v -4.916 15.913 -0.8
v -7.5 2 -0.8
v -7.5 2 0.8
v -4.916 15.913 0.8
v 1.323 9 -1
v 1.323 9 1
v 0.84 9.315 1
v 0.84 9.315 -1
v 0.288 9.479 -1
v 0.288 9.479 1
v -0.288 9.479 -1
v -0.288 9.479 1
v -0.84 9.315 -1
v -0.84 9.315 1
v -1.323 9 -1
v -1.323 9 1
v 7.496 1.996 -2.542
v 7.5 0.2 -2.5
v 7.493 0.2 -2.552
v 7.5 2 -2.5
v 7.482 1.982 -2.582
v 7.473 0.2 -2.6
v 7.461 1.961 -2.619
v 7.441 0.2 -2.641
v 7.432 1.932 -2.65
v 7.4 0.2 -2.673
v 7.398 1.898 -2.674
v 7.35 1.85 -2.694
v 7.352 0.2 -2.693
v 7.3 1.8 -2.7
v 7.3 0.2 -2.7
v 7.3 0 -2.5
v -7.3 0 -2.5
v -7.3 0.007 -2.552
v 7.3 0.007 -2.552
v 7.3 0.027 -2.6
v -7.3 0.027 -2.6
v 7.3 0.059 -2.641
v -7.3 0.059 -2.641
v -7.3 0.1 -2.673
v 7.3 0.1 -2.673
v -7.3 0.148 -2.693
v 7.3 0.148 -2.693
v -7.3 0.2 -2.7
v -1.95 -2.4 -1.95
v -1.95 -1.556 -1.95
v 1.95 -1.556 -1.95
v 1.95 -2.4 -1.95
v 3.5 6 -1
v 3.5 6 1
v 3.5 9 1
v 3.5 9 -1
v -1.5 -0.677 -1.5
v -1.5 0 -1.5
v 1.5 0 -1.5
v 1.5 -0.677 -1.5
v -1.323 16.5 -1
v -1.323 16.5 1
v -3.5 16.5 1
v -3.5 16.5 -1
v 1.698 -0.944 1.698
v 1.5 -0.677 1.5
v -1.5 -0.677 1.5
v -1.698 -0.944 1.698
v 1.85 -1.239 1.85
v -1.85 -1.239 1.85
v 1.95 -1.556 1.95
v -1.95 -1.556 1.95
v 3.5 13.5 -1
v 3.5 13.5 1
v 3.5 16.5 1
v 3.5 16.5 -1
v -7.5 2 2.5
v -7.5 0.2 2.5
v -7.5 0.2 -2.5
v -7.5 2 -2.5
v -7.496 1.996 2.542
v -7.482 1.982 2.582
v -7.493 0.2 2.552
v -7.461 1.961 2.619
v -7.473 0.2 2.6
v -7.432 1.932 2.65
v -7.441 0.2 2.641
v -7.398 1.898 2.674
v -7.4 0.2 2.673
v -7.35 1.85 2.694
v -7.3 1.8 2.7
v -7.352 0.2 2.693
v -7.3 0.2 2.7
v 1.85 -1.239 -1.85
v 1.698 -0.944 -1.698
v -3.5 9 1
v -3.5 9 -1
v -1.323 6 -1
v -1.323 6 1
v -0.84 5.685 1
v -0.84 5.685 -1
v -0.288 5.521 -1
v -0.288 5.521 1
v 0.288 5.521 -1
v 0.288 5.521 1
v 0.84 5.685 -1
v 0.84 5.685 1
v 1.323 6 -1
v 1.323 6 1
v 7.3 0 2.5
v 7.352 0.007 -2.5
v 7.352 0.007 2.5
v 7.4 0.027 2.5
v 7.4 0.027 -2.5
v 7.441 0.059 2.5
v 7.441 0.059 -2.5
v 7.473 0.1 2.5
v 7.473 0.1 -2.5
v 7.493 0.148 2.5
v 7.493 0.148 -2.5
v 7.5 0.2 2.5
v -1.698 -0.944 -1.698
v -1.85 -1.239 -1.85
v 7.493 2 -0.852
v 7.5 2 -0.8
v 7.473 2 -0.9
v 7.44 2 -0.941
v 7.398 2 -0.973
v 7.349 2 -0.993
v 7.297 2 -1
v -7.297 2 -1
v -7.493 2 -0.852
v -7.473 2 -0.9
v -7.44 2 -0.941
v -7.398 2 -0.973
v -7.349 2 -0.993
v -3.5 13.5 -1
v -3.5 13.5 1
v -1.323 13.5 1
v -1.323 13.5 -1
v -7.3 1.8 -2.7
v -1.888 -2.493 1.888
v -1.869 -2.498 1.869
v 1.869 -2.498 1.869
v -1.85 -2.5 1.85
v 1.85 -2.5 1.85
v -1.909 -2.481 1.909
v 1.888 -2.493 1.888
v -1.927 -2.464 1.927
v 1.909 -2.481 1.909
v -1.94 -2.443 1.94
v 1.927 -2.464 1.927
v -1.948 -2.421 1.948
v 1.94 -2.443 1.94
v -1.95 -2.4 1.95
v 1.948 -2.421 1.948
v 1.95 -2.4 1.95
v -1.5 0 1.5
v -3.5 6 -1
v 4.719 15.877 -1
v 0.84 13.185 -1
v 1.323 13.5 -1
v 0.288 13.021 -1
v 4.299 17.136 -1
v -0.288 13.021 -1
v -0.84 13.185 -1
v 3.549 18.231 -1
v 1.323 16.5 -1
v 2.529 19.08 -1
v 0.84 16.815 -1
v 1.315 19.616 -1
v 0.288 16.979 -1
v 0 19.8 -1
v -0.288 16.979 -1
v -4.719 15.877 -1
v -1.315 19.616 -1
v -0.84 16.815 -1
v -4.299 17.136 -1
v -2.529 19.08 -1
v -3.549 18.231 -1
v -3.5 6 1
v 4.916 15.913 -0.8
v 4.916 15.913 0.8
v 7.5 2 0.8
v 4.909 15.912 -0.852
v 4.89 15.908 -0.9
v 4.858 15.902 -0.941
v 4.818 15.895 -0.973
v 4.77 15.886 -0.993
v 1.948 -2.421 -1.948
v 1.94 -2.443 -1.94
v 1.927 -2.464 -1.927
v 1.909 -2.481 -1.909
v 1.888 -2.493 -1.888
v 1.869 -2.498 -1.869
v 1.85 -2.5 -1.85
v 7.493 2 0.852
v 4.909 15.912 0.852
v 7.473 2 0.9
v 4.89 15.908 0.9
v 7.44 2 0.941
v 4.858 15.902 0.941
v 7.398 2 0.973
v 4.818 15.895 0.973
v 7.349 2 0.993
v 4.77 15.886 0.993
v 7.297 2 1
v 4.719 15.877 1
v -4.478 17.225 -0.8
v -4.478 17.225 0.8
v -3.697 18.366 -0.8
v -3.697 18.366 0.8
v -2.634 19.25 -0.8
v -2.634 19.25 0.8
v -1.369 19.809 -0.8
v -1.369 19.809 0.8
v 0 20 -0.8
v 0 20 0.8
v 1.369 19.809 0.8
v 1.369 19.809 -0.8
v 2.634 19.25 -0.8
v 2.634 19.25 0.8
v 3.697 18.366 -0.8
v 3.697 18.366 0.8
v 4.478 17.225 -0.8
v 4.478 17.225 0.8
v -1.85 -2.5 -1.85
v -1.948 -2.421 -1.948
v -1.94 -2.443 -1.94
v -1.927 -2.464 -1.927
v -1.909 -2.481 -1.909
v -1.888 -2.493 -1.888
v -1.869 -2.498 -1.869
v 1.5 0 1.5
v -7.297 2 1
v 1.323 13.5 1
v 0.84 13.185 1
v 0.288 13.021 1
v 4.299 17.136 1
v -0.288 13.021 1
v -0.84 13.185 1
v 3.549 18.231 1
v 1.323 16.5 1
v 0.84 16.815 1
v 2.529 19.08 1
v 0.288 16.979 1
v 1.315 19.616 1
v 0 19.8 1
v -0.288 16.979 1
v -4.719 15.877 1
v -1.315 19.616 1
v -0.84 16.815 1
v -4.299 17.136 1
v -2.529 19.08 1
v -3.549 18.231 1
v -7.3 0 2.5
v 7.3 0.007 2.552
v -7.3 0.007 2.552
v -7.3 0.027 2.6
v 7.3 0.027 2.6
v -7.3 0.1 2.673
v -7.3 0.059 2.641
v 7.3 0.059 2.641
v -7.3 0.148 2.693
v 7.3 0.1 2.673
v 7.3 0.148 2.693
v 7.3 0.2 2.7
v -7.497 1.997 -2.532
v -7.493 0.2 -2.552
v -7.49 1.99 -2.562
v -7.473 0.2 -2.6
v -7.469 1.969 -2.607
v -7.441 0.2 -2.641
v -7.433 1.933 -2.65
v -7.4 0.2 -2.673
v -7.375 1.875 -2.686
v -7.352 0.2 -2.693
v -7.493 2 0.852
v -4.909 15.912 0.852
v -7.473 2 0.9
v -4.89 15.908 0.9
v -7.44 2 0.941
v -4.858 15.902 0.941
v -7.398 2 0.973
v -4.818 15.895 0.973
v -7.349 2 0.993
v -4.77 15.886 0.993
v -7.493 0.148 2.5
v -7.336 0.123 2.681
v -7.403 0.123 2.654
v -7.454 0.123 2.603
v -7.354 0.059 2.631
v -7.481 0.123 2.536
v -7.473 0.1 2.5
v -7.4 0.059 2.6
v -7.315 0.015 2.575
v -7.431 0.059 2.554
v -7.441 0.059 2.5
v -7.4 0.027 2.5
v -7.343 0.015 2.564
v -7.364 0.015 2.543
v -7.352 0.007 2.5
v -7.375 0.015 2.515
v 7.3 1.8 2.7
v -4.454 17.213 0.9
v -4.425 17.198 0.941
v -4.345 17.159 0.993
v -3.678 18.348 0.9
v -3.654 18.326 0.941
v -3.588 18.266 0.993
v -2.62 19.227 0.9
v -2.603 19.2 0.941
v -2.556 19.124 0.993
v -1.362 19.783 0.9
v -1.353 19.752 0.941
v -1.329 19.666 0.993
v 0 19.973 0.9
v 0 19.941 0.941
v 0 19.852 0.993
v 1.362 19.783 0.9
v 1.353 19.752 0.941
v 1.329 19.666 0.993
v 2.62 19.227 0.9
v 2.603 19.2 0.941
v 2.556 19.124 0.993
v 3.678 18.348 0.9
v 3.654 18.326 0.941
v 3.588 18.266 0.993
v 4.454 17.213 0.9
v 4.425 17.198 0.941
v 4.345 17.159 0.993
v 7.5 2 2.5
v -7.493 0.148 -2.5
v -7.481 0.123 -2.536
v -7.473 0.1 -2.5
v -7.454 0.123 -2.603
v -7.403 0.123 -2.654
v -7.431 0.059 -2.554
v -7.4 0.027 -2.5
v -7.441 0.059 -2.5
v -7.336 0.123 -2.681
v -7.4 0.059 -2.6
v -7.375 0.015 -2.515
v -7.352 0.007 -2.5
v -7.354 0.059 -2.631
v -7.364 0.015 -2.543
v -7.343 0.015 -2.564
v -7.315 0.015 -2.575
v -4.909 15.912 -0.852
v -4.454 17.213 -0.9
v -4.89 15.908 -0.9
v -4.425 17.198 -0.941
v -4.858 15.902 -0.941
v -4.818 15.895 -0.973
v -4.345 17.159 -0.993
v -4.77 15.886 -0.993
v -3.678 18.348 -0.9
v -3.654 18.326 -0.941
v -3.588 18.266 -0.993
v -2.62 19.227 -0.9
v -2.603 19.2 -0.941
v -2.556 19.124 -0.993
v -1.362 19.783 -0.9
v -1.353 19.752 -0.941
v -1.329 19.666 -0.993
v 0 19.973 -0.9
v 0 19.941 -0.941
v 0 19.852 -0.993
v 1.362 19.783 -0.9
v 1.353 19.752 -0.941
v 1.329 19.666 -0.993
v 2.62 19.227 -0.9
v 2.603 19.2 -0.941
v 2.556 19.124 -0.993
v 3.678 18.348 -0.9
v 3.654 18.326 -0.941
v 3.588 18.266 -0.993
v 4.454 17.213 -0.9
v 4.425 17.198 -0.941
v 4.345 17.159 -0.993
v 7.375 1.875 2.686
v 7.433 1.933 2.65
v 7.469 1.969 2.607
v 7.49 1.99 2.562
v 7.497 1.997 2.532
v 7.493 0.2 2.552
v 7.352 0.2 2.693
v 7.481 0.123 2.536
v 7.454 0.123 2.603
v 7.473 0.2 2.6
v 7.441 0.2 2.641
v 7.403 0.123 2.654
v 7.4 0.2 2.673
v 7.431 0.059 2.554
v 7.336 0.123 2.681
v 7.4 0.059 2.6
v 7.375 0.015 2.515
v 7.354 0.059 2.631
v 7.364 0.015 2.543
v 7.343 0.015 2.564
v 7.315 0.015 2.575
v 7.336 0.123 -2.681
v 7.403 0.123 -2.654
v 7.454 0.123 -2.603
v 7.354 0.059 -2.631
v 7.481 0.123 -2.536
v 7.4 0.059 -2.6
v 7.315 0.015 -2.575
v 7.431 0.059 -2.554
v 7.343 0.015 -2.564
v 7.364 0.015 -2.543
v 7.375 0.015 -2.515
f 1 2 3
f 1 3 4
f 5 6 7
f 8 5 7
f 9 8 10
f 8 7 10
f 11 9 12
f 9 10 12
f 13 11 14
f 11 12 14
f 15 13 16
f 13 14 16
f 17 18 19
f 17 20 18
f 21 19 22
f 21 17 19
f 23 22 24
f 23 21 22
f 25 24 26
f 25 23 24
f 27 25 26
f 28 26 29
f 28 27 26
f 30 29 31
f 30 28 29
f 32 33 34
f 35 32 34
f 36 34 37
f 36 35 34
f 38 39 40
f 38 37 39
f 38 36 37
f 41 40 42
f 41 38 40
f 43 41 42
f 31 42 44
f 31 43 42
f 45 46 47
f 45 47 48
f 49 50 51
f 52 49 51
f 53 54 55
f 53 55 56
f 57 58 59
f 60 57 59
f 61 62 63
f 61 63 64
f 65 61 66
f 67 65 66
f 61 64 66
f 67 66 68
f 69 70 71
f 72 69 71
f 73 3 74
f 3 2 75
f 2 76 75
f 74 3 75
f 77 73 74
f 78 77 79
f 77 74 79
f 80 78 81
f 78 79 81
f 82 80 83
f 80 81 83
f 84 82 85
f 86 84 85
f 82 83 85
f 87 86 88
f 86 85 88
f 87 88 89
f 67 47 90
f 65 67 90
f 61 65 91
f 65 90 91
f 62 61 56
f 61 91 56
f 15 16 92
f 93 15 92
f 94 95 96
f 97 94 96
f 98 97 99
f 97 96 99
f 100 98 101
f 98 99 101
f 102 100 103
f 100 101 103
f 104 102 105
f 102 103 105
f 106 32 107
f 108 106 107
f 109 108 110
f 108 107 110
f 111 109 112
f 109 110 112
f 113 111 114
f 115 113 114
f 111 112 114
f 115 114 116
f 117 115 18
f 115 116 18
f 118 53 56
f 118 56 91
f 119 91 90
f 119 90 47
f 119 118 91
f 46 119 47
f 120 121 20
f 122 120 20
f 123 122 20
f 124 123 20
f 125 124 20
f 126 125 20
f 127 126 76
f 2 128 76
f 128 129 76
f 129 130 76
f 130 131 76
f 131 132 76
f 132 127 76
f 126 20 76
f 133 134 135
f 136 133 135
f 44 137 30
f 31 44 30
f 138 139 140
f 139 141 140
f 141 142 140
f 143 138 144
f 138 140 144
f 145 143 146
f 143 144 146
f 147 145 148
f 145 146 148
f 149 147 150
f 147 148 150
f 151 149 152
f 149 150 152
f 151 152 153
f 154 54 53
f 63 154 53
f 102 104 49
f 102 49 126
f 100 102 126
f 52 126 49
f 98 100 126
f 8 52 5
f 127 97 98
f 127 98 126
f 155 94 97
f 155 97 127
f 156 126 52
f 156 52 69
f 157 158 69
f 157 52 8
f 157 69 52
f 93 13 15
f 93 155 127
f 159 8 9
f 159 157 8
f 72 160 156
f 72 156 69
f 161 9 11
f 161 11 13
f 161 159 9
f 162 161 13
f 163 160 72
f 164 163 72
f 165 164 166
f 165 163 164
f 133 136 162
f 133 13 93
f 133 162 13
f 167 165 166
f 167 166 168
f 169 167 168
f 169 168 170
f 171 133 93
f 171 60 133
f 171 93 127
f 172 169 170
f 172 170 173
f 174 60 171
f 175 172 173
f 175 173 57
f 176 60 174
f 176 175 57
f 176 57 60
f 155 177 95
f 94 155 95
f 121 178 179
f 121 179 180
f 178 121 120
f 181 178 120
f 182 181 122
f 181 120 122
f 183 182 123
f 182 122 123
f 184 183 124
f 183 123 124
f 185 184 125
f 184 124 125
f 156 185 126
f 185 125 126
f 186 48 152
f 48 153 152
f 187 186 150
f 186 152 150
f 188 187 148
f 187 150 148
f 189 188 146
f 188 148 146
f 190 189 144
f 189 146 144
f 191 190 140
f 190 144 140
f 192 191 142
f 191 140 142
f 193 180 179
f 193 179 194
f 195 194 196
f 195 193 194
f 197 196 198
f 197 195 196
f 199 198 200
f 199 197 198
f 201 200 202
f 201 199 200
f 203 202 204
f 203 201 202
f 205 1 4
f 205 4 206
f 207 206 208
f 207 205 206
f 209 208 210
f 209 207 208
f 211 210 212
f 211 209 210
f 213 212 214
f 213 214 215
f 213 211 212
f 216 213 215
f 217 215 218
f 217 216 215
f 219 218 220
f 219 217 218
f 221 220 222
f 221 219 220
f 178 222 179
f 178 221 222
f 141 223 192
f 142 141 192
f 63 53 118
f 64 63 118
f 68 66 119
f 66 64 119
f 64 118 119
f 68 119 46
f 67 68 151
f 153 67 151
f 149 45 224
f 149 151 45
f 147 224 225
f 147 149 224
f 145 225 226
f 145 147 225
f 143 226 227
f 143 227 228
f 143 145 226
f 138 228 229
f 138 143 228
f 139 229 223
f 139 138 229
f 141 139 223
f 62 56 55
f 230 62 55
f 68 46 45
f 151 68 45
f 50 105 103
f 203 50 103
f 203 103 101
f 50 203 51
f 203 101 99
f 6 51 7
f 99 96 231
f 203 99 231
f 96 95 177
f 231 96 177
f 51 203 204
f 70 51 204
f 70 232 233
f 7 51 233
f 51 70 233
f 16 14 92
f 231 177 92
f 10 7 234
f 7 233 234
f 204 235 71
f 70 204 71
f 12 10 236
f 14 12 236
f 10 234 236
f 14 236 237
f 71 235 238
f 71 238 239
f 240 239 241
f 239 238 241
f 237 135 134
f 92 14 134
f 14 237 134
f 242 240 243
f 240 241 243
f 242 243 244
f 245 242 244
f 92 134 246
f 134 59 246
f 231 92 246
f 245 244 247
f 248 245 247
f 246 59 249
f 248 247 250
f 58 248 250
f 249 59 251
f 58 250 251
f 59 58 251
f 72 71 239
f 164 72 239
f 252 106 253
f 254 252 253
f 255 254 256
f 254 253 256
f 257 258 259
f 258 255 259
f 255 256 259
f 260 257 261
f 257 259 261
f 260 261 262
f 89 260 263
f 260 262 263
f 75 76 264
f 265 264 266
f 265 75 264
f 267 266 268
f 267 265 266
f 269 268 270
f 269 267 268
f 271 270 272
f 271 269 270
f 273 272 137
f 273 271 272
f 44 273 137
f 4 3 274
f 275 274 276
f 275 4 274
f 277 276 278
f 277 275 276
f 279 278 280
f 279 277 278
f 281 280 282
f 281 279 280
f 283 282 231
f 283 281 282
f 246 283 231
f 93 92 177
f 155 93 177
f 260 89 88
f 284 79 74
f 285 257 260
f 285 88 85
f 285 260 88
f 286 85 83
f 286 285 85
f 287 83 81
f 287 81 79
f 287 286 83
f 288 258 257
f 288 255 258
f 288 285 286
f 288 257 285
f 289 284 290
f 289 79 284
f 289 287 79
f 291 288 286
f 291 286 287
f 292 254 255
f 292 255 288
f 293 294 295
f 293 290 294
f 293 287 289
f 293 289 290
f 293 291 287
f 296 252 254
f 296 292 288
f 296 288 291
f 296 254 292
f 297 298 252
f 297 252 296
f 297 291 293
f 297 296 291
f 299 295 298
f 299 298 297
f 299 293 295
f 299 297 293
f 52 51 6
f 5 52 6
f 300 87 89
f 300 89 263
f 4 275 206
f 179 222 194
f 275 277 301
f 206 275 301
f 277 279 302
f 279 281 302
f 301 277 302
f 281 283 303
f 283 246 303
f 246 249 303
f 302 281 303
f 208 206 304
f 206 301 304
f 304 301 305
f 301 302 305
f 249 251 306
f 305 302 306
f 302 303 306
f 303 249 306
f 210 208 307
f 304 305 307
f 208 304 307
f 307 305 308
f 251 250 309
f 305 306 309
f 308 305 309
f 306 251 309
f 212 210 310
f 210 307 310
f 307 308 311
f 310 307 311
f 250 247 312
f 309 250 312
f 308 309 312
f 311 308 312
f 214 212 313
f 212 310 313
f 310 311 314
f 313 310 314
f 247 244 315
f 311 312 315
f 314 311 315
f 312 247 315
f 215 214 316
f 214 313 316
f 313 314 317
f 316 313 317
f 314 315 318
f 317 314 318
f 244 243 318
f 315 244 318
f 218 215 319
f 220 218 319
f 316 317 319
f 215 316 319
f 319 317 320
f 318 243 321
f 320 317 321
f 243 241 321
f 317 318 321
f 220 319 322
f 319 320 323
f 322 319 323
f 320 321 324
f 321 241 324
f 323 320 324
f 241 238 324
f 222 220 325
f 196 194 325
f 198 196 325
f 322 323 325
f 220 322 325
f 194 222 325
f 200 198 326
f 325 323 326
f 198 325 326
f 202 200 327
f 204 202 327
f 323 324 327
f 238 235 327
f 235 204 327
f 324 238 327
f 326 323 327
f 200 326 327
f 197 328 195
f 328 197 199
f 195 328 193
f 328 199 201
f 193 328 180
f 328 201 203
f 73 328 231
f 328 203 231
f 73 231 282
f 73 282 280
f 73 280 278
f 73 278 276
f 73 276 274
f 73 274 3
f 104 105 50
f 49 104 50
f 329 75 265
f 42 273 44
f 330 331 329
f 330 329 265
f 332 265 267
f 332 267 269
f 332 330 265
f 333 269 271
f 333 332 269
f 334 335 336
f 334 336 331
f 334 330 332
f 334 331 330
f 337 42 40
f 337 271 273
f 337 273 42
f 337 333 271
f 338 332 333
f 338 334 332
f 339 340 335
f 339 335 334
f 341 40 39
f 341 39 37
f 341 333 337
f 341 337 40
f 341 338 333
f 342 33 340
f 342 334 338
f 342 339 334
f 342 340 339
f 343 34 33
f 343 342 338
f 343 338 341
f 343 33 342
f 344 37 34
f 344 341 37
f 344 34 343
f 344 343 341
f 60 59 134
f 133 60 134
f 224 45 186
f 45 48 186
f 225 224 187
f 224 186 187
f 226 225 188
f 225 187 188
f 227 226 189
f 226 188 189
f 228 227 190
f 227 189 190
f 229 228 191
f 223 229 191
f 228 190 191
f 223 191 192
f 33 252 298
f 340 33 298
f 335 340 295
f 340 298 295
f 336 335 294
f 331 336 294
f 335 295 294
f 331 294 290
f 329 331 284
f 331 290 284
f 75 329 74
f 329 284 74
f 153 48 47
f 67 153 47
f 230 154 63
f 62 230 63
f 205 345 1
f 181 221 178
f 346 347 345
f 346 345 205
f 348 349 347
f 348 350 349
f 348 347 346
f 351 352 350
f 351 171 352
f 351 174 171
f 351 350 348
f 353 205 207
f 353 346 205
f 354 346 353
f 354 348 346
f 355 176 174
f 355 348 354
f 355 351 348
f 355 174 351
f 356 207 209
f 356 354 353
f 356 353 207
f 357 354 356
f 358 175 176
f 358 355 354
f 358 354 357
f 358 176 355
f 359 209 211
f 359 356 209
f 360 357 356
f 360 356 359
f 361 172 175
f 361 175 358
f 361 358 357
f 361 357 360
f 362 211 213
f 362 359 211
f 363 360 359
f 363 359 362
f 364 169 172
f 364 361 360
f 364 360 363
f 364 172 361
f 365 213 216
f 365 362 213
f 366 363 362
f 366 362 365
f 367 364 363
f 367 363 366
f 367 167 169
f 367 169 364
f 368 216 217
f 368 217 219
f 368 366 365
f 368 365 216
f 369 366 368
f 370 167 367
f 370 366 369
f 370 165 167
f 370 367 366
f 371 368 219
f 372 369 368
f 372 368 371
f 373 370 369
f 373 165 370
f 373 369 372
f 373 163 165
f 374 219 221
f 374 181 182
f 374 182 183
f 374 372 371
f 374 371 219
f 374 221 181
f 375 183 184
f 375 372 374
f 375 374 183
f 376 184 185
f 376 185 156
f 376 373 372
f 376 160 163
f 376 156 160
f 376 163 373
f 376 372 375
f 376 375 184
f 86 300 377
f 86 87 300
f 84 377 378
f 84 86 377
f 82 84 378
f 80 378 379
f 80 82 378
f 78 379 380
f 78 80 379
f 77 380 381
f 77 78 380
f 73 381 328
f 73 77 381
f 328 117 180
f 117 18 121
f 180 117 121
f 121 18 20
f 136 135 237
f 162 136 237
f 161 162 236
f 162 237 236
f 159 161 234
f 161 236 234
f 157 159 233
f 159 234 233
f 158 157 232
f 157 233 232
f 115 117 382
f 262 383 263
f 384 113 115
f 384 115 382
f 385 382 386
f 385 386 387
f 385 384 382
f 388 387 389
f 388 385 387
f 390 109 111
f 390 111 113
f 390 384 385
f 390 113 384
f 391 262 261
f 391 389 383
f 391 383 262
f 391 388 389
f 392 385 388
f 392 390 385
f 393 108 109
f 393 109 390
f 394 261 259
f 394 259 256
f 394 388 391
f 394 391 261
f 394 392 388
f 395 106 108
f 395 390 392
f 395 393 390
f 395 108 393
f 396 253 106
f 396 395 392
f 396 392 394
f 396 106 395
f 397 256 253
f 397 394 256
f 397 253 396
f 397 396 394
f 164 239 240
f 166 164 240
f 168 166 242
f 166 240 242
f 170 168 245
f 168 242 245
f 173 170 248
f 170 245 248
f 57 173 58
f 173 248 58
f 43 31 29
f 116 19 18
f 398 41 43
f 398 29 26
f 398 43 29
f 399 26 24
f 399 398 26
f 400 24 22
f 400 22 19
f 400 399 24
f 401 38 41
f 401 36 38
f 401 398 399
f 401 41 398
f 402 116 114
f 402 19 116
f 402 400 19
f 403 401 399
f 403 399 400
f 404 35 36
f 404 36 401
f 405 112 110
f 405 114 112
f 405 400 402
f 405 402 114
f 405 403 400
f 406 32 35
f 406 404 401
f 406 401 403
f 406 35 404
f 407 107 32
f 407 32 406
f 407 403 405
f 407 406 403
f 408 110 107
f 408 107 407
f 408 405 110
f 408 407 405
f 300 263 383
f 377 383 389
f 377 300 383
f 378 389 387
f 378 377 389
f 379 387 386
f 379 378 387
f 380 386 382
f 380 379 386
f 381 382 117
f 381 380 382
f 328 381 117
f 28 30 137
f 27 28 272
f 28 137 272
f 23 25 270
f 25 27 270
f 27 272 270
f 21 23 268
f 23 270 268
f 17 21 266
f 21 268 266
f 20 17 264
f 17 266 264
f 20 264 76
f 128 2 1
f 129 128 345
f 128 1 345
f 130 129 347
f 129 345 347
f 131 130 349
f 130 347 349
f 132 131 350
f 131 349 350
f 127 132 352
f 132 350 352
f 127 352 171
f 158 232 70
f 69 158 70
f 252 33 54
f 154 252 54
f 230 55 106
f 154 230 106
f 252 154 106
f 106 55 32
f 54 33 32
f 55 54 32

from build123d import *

# Parameters (mm, degrees)
EXTRUDE_1_DEPTH          = 2.7
EXTRUDE_1_DEPTH_BACK     = 2.7
EXTRUDE_2_DEPTH          = 1
EXTRUDE_2_DEPTH_BACK     = 1
CUT_EXTRUDE_1_DEPTH      = 22.678099548
PATTERN_LINEAR_1_COUNT   = 2
PATTERN_LINEAR_1_PITCH   = 7.5
EXTRUDE_3_DEPTH          = 2
EXTRUDE_3_DEPTH_BACK     = 2
CUT_EXTRUDE_2_DEPTH      = 2
CUT_EXTRUDE_2_DEPTH_BACK = 2
FILLET_1_R               = 0.1
FILLET_4_R               = 0.2
FILLET_5_R               = 0.2
FILLET_7_R               = 0.2


with BuildPart() as part:
    # 草图1 → 凸台-拉伸1 (new, two sides: drawn at the far end of the back side and taken through both)
    with BuildSketch(Plane.XY.offset(-EXTRUDE_1_DEPTH_BACK)):
        Polygon((0, 0), (7.5, 0), (7.5, 2), (-7.5, 2), (-7.5, 0), align=None)
    extrude(amount=EXTRUDE_1_DEPTH + EXTRUDE_1_DEPTH_BACK)

    # 草图2 → 凸台-拉伸2 (add, two sides: drawn at the far end of the back side and taken through both)
    with BuildSketch(Plane.XY.offset(-EXTRUDE_2_DEPTH_BACK)):
        with BuildLine():
            Line((-7.5, 2), (-4.91592968, 15.913036354))
            ThreePointArc((-4.91592968, 15.913036354), (0, 20), (4.91592968, 15.913036354))
            Line((4.91592968, 15.913036354), (7.5, 2))
            Line((7.5, 2), (-7.5, 2))
        make_face()
    extrude(amount=EXTRUDE_2_DEPTH + EXTRUDE_2_DEPTH_BACK)

    # 草图3 → 切除-拉伸1 (cut, through all)
    with BuildSketch(Plane.XY.offset(1)):
        with BuildLine():
            Line((3.5, 6), (3.5, 9))
            Line((3.5, 9), (1.322875656, 9))
            ThreePointArc((1.322875656, 9), (0, 9.5), (-1.322875656, 9))
            Line((-1.322875656, 9), (-3.5, 9))
            Line((-3.5, 9), (-3.5, 6))
            Line((-3.5, 6), (-1.322875656, 6))
            ThreePointArc((-1.322875656, 6), (0, 5.5), (1.322875656, 6))
            Line((1.322875656, 6), (3.5, 6))
        make_face()
    cut_extrude_1 = extrude(amount=-CUT_EXTRUDE_1_DEPTH, mode=Mode.SUBTRACT)

    # 阵列(线性)1: 切除-拉伸1 ×2
    with Locations(*[(0, i * PATTERN_LINEAR_1_PITCH, 0) for i in range(1, PATTERN_LINEAR_1_COUNT)]):
        add(cut_extrude_1, mode=Mode.SUBTRACT)

    # 草图4 → 凸台-拉伸3 (add, two sides: drawn at the far end of the back side and taken through both)
    with BuildSketch(Plane.XY.offset(-EXTRUDE_3_DEPTH_BACK)):
        with BuildLine():
            Line((1.5, 0), (-1.5, 0))
            Line((-1.5, 0), (-1.5, -0.677124344))
            ThreePointArc((-1.5, -0.677124344), (-1.780042303, -1.088161527), (-1.95, -1.555590279))
            Line((-1.95, -1.555590279), (-1.95, -2.5))
            Line((-1.95, -2.5), (1.95, -2.5))
            Line((1.95, -2.5), (1.95, -1.555590279))
            ThreePointArc((1.95, -1.555590279), (1.780042303, -1.088161527), (1.5, -0.677124344))
            Line((1.5, -0.677124344), (1.5, 0))
        make_face()
    extrude(amount=EXTRUDE_3_DEPTH + EXTRUDE_3_DEPTH_BACK)

    # 草图5 → 切除-拉伸2 (cut, two sides: drawn at the far end of the back side and taken through both)
    with BuildSketch(Plane(origin=(0, 0, 0), x_dir=(0, 0, -1), z_dir=(1, 0, 0)).offset(-CUT_EXTRUDE_2_DEPTH_BACK)):
        with BuildLine():
            Line((1.5, 0), (1.5, -0.677124344))
            ThreePointArc((1.5, -0.677124344), (1.780042303, -1.088161527), (1.95, -1.555590279))
            Line((1.95, -1.555590279), (1.95, -2.5))
            Line((1.95, -2.5), (2, -2.5))
            Line((2, -2.5), (2, 0))
            Line((2, 0), (1.5, 0))
        make_face()
        with BuildLine():
            Line((-2, 0), (-1.5, 0))
            Line((-1.5, 0), (-1.5, -0.677124344))
            ThreePointArc((-1.5, -0.677124344), (-1.780042303, -1.088161527), (-1.95, -1.555590279))
            Line((-1.95, -1.555590279), (-1.95, -2.5))
            Line((-1.95, -2.5), (-2, -2.5))
            Line((-2, -2.5), (-2, 0))
        make_face()
    extrude(amount=CUT_EXTRUDE_2_DEPTH + CUT_EXTRUDE_2_DEPTH_BACK, mode=Mode.SUBTRACT)

    # 圆角1
    fillet_1_edges = [part.edges().sort_by_distance(p)[0] for p in [
        (-1.95, -2.5, 0),
        (1.95, -2.5, 0),
        (0, -2.5, -1.95),
        (0, -2.5, 1.95),
    ]]
    fillet(fillet_1_edges, radius=FILLET_1_R)

    # 圆角4
    fillet_4_edges = [part.edges().sort_by_distance(p)[0] for p in [
        (-7.5, 1, 2.7),
        (0, 2, 2.7),
        (7.5, 1, 2.7),
        (0, 0, 2.7),
        (7.5, 1, -2.7),
        (0, 2, -2.7),
        (-7.5, 1, -2.7),
        (0, 0, -2.7),
    ]]
    fillet(fillet_4_edges, radius=FILLET_4_R)

    # 圆角5
    # the kernel refuses this fillet: 0.2 mm, written as the material it takes off along each edge
    with BuildSketch(Plane(origin=(7.3, 0.2, 2.5), x_dir=(1, 0, 0), z_dir=(0, -1, 0))) as fillet_5_piece_1_section:
        Polygon((0, 0), (FILLET_5_R, 0), (FILLET_5_R, FILLET_5_R), (0, FILLET_5_R), align=None)
    fillet_5_piece_1 = extrude(amount=FILLET_5_R, mode=Mode.PRIVATE)
    fillet_5_piece_1 = fillet_5_piece_1 - Plane(origin=(7.3, 0.2, 2.5), x_dir=(-0.7071067811865475, 0, -0.7071067811865475), z_dir=(0, -1, 0)) * Sphere(FILLET_5_R, mode=Mode.PRIVATE)
    add(fillet_5_piece_1, mode=Mode.SUBTRACT)
    with BuildSketch(Plane(origin=(-7.3, 0.2, 2.5), x_dir=(-1, 0, 0), z_dir=(0, -1, 0))) as fillet_5_piece_2_section:
        Polygon((0, 0), (FILLET_5_R, 0), (FILLET_5_R, -FILLET_5_R), (0, -FILLET_5_R), align=None)
    fillet_5_piece_2 = extrude(amount=FILLET_5_R, mode=Mode.PRIVATE)
    fillet_5_piece_2 = fillet_5_piece_2 - Plane(origin=(-7.3, 0.2, 2.5), x_dir=(0.7071067811865475, 1.2560739669470211e-15, -0.7071067811865475), z_dir=(0, -1, 0)) * Sphere(FILLET_5_R, mode=Mode.PRIVATE)
    add(fillet_5_piece_2, mode=Mode.SUBTRACT)
    with BuildSketch(Plane(origin=(-7.3, 0.2, -2.5), x_dir=(-1, 0, 0), z_dir=(0, -1, 0))) as fillet_5_piece_3_section:
        Polygon((0, 0), (FILLET_5_R, 0), (FILLET_5_R, FILLET_5_R), (0, FILLET_5_R), align=None)
    fillet_5_piece_3 = extrude(amount=FILLET_5_R, mode=Mode.PRIVATE)
    fillet_5_piece_3 = fillet_5_piece_3 - Plane(origin=(-7.3, 0.2, -2.5), x_dir=(0.7071067811865475, 1.2560739669470211e-15, 0.7071067811865475), z_dir=(0, -1, 0)) * Sphere(FILLET_5_R, mode=Mode.PRIVATE)
    add(fillet_5_piece_3, mode=Mode.SUBTRACT)
    with BuildSketch(Plane(origin=(7.3, 0.2, -2.5), x_dir=(1, 0, 0), z_dir=(0, -1, 0))) as fillet_5_piece_4_section:
        Polygon((0, 0), (FILLET_5_R, 0), (FILLET_5_R, -FILLET_5_R), (0, -FILLET_5_R), align=None)
    fillet_5_piece_4 = extrude(amount=FILLET_5_R, mode=Mode.PRIVATE)
    fillet_5_piece_4 = fillet_5_piece_4 - Plane(origin=(7.3, 0.2, -2.5), x_dir=(-0.7071067811865475, 0, 0.7071067811865475), z_dir=(0, -1, 0)) * Sphere(FILLET_5_R, mode=Mode.PRIVATE)
    add(fillet_5_piece_4, mode=Mode.SUBTRACT)
    with BuildSketch(Plane(origin=(-7.5, 0, 2.5), x_dir=(1, 0, 0), z_dir=(0, 0, -1)), Plane(origin=(7.5, 0, -2.5), x_dir=(-1, 0, 0), z_dir=(0, 0, 1))) as fillet_5_piece_5:
        with BuildLine():
            CenterArc((FILLET_5_R, -FILLET_5_R), FILLET_5_R, 90, 90)
            Line((0, -FILLET_5_R), (0, 0))
            Line((0, 0), (FILLET_5_R, 0))
        make_face()
    extrude(amount=5, mode=Mode.SUBTRACT)

    # 圆角7
    fillet_7_edges = [part.edges().sort_by_distance(p)[0] for p in [
        (6.20796484, 8.956518177, 1),
        (0, 20, 1),
        (-6.20796484, 8.956518177, 1),
        (-6.20796484, 8.956518177, -1),
        (0, 20, -1),
        (6.20796484, 8.956518177, -1),
    ]]
    fillet(fillet_7_edges, radius=FILLET_7_R)


solid = part.part
